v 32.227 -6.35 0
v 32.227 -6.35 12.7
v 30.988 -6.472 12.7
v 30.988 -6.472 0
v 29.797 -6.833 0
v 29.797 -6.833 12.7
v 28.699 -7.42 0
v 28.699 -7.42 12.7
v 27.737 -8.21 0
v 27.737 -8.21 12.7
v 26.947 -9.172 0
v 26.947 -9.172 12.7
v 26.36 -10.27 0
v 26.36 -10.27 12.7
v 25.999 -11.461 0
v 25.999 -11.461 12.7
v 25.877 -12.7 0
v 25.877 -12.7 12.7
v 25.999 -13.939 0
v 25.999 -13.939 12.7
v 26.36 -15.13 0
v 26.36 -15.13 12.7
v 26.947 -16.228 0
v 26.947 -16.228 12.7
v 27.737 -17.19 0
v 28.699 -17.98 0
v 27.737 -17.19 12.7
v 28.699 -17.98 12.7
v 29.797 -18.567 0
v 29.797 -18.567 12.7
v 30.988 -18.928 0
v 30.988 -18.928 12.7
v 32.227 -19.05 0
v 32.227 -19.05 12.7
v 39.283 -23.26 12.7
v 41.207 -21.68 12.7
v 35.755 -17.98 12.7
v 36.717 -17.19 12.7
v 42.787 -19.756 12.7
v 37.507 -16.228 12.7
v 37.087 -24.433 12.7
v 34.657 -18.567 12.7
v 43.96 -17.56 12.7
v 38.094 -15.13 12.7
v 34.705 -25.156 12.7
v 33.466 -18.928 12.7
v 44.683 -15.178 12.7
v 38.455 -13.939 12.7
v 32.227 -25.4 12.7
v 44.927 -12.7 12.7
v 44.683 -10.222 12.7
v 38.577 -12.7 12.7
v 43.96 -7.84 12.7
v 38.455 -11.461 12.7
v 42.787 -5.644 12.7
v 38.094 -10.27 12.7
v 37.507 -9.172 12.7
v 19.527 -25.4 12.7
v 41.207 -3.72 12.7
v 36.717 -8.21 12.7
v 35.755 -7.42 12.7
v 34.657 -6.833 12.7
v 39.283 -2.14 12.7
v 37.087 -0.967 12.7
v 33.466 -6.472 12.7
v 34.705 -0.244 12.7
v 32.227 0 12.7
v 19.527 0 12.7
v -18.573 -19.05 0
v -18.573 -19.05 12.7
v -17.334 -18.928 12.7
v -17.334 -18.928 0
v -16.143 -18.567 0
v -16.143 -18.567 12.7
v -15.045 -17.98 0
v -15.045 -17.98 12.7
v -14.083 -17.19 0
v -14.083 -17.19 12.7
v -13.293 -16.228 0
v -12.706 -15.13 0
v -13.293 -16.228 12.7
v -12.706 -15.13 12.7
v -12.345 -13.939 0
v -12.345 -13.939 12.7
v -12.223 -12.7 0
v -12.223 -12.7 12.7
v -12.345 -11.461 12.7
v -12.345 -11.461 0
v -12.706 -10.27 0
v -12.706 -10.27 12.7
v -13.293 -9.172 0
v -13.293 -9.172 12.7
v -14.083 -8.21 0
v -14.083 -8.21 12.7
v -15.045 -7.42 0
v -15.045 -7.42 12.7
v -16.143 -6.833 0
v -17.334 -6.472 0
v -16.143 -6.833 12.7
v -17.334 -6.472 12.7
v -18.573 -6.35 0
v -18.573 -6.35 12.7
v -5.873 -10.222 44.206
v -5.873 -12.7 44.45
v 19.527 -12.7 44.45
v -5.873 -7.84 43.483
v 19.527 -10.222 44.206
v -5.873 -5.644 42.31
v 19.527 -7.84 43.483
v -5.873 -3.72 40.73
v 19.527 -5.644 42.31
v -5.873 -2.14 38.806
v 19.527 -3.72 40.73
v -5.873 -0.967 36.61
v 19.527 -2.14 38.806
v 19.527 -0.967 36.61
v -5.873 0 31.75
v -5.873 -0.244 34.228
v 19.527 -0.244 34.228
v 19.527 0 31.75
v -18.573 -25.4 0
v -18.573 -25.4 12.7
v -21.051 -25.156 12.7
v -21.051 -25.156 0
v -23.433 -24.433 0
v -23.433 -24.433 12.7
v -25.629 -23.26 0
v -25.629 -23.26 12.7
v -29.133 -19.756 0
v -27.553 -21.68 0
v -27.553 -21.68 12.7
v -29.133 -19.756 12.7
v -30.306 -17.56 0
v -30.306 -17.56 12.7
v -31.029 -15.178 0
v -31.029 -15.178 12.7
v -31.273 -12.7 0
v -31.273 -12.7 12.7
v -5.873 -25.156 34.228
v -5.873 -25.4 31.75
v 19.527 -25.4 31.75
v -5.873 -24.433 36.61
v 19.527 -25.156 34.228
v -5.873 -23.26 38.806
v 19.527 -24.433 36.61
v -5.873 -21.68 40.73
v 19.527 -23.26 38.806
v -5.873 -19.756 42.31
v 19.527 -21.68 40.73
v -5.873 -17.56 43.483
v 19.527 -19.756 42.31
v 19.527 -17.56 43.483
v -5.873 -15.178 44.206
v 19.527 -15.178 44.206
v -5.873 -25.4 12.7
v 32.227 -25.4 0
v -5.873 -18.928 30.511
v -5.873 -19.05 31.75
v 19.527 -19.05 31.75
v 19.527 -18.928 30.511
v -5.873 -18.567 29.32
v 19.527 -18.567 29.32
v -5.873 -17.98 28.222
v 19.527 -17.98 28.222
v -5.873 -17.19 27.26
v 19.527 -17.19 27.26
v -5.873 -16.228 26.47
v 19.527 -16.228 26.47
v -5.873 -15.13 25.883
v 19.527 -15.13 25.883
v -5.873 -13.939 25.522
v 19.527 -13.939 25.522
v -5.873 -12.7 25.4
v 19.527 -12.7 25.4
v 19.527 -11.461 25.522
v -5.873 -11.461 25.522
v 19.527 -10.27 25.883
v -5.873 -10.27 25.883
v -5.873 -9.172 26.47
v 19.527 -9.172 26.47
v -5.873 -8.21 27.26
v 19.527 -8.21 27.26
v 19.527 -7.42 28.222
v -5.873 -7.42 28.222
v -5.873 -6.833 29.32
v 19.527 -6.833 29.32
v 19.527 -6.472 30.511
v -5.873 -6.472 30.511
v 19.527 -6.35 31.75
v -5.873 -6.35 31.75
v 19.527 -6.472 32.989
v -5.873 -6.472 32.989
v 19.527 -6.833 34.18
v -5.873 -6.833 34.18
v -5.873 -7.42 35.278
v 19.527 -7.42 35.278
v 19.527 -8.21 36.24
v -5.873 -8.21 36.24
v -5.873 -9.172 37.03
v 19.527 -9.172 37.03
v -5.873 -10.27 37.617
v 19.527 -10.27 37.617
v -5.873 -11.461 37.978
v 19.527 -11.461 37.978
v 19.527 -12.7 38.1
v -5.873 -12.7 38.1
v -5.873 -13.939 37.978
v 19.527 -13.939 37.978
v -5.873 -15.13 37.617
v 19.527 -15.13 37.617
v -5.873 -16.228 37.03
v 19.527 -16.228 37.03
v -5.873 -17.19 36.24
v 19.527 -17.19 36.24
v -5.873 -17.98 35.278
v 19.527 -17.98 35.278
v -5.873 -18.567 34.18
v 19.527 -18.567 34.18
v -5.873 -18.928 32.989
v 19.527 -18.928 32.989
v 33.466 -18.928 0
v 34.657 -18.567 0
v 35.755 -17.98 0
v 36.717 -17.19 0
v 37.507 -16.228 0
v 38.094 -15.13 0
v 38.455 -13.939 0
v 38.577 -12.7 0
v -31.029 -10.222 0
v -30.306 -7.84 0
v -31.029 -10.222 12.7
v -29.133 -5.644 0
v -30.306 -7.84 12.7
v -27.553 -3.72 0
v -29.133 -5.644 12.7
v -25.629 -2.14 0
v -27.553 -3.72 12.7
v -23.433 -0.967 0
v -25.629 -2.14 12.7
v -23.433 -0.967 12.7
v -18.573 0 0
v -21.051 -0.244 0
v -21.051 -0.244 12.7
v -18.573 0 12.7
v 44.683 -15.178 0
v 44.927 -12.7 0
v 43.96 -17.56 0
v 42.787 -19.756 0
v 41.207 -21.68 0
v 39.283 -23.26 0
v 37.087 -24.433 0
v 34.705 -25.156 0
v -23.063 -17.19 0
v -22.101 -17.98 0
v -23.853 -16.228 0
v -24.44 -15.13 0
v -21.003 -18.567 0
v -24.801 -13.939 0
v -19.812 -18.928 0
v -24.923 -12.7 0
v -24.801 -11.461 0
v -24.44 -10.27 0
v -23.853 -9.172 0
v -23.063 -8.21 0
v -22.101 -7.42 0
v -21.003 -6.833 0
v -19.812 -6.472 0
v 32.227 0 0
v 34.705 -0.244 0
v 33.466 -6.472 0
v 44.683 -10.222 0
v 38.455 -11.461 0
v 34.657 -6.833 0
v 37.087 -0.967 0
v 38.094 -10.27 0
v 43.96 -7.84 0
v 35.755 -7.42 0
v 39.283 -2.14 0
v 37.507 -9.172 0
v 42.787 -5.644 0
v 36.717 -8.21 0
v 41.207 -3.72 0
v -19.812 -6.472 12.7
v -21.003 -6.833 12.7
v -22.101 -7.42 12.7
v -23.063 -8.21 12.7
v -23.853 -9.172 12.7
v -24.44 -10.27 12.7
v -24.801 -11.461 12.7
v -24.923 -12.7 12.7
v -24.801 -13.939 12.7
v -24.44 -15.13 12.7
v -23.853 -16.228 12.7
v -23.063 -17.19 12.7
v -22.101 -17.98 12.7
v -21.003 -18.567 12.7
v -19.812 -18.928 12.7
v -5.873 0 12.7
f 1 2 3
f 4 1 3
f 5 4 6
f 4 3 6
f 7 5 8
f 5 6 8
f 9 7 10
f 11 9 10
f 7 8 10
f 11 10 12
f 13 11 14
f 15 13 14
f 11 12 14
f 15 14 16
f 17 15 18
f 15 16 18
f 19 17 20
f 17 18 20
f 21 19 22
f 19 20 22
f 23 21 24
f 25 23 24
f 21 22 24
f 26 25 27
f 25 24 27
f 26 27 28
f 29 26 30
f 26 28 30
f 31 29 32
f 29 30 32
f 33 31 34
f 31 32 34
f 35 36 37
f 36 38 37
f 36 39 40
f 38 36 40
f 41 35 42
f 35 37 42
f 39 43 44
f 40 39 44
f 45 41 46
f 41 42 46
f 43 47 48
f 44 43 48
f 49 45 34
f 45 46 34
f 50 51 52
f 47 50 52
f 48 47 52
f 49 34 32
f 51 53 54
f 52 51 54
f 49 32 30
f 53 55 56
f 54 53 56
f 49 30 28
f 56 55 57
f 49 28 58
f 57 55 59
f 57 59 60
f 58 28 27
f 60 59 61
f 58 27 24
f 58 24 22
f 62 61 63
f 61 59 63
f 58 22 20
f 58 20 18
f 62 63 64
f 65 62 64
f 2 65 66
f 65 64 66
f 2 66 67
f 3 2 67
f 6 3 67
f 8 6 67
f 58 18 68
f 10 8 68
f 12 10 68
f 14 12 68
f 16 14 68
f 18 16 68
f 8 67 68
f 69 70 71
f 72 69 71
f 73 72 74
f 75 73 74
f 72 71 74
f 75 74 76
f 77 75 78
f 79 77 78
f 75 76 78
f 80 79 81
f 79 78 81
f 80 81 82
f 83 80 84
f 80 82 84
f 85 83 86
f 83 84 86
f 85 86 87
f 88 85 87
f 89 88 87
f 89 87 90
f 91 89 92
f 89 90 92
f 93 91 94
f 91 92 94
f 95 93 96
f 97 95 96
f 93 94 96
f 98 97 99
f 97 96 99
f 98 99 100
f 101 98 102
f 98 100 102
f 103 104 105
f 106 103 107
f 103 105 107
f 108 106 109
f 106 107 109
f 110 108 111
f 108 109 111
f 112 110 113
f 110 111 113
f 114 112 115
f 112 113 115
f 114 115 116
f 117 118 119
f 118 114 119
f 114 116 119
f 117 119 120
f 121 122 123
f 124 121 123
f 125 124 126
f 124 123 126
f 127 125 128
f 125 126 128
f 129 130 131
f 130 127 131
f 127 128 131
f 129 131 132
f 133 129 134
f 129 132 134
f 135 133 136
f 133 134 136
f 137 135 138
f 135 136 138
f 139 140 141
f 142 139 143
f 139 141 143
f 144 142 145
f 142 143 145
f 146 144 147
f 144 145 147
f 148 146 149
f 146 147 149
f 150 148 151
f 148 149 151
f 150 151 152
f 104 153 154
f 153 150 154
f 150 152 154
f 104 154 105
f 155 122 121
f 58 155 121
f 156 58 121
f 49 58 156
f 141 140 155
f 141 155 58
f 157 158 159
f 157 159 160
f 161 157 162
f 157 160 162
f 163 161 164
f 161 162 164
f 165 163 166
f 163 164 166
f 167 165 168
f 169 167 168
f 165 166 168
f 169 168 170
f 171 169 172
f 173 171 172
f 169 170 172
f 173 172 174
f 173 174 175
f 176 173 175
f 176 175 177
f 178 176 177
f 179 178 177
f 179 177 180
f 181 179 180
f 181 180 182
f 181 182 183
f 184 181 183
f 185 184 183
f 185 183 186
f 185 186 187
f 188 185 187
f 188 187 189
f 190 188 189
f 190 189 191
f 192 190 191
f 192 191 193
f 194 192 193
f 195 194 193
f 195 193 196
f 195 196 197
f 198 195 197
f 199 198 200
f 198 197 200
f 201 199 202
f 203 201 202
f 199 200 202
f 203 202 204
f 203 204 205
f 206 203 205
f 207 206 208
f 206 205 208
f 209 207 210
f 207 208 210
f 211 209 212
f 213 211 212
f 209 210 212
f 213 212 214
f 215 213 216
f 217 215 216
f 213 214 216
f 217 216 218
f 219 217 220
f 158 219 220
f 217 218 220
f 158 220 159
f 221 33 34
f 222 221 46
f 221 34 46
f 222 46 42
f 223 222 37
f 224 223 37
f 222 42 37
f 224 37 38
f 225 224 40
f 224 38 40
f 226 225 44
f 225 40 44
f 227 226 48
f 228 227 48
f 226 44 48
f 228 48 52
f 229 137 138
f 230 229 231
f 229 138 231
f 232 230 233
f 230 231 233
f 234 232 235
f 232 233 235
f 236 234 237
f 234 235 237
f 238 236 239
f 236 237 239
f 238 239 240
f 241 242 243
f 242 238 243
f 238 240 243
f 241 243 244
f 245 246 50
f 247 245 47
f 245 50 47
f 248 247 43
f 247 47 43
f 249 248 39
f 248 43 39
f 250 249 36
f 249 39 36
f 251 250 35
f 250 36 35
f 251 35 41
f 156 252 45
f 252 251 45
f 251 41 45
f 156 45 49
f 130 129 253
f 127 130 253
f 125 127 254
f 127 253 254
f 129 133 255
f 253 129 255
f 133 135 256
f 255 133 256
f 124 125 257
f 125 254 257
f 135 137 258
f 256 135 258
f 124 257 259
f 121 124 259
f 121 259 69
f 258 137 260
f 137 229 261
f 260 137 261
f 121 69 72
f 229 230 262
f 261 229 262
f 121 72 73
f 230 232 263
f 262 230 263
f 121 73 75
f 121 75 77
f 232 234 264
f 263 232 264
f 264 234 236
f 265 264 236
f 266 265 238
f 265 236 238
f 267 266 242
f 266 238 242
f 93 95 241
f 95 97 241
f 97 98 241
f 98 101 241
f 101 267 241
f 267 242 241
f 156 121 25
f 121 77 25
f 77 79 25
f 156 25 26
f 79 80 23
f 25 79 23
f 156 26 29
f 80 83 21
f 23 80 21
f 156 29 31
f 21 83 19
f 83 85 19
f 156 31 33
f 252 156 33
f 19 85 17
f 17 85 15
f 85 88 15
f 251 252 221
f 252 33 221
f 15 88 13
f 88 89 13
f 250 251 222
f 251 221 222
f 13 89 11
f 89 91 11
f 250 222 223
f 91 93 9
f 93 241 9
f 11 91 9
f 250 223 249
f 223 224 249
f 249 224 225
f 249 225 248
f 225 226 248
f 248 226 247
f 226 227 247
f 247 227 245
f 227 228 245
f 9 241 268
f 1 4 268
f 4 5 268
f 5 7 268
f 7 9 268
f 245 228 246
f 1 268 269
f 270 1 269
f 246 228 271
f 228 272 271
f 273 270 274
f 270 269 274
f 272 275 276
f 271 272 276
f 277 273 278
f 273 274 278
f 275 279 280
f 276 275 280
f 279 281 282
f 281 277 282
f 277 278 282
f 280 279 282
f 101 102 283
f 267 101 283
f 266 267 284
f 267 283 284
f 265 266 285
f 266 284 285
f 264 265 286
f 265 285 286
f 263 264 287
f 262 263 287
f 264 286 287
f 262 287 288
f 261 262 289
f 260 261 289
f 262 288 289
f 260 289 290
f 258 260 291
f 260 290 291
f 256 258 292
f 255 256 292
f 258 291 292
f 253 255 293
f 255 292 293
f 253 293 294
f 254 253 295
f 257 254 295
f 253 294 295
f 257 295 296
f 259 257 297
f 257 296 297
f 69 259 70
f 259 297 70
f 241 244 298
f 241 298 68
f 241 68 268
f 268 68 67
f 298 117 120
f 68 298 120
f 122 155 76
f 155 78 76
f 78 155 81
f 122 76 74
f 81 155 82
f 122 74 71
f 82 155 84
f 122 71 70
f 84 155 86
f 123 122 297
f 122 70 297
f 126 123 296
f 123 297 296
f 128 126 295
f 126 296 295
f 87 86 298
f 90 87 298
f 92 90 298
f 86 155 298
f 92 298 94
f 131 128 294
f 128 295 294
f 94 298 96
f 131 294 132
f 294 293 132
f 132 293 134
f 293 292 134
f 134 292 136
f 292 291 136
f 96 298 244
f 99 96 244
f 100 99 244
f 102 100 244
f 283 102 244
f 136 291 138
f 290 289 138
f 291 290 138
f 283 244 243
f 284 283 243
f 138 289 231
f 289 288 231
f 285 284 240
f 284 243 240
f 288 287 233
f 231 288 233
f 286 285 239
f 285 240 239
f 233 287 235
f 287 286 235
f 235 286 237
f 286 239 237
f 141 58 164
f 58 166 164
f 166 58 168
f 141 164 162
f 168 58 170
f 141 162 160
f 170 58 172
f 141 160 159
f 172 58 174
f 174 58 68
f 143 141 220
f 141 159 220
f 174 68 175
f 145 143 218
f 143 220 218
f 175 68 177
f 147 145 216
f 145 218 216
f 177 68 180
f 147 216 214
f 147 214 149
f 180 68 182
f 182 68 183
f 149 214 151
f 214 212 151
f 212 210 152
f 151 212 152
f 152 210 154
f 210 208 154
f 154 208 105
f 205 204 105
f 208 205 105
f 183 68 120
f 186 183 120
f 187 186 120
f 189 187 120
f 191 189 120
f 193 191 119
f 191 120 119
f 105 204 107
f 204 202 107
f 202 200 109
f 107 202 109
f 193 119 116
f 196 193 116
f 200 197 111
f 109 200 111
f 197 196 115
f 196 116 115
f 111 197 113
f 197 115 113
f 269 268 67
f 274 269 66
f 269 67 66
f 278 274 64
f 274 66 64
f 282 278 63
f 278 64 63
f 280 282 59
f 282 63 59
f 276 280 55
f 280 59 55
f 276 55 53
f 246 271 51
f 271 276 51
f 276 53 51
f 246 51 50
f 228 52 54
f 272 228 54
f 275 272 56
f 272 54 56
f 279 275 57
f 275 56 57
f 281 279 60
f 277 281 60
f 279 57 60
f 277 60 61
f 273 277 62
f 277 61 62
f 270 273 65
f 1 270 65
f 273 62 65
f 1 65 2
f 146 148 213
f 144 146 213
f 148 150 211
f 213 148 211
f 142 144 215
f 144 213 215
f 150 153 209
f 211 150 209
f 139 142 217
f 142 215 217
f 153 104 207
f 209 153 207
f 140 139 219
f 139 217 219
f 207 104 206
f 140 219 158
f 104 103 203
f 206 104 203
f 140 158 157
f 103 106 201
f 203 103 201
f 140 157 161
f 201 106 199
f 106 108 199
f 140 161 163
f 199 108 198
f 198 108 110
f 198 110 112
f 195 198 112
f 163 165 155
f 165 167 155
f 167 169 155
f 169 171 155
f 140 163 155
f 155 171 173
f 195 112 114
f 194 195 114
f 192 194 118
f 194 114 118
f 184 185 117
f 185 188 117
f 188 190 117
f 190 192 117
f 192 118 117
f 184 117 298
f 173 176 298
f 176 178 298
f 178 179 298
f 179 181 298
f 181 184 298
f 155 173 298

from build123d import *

# Parameters (mm, degrees)
F1_DEPTH = 25.4
F3_DEPTH = 12.701
F5_DEPTH = 12.701
F7_DEPTH = 50.801


with BuildPart() as f1:
    # F0 (on Front) → F1 (new body)
    with BuildSketch(Plane.XZ):
        Polygon((-31.273121752, 12.7), (-31.273121752, 0), (44.926878248, 0), (44.926878248, 12.7), (19.526878248, 12.7), (19.526878248, 44.45), (-5.873121752, 44.45), (-5.873121752, 12.7), align=None)
    extrude(amount=F1_DEPTH)

    # F2 (on face) → F3 (cut, through all)
    with BuildSketch(Plane.XY.offset(12.7)):
        with BuildLine():
            ThreePointArc((38.576878248, -12.7), (36.7170063085, -8.2098719395), (32.226878248, -6.35))
            Line((32.226878248, -6.35), (32.226878248, -19.05))
            ThreePointArc((32.226878248, -19.05), (36.7170063085, -17.1901280605), (38.576878248, -12.7))
        make_face()
        with BuildLine():
            Line((32.226878248, -19.05), (32.226878248, -6.35))
            ThreePointArc((32.226878248, -6.35), (25.876878248, -12.7), (32.226878248, -19.05))
        make_face()
        with BuildLine():
            Line((44.926878248, 0), (32.226878248, 0))
            ThreePointArc((32.226878248, 0), (41.2071343691, -3.7197438789), (44.926878248, -12.7))
            Line((44.926878248, -12.7), (44.926878248, 0))
        make_face()
        with BuildLine():
            Line((44.926878248, -25.4), (44.926878248, -12.7))
            ThreePointArc((44.926878248, -12.7), (41.2071343691, -21.6802561211), (32.226878248, -25.4))
            Line((32.226878248, -25.4), (44.926878248, -25.4))
        make_face()
    extrude(amount=-F3_DEPTH, mode=Mode.SUBTRACT)

    # F4 (on face) → F5 (cut, through all)
    with BuildSketch(Plane.XY.offset(12.7)):
        with BuildLine():
            ThreePointArc((-12.223121752, -12.7), (-14.0829936915, -8.2098719395), (-18.573121752, -6.35))
            Line((-18.573121752, -6.35), (-18.573121752, -19.05))
            ThreePointArc((-18.573121752, -19.05), (-14.0829936915, -17.1901280605), (-12.223121752, -12.7))
        make_face()
        with BuildLine():
            Line((-18.573121752, -19.05), (-18.573121752, -6.35))
            ThreePointArc((-18.573121752, -6.35), (-24.923121752, -12.7), (-18.573121752, -19.05))
        make_face()
        with BuildLine():
            ThreePointArc((-31.273121752, -12.7), (-27.5533778731, -3.7197438789), (-18.573121752, 0))
            Line((-18.573121752, 0), (-31.273121752, 0))
            Line((-31.273121752, 0), (-31.273121752, -12.7))
        make_face()
        with BuildLine():
            ThreePointArc((-18.573121752, -25.4), (-27.5533778731, -21.6802561211), (-31.273121752, -12.7))
            Line((-31.273121752, -12.7), (-31.273121752, -25.4))
            Line((-31.273121752, -25.4), (-18.573121752, -25.4))
        make_face()
    extrude(amount=-F5_DEPTH, mode=Mode.SUBTRACT)

    # F6 (on face) → F7 (cut, through all)
    with BuildSketch(Plane.YZ.offset(19.526878248)):
        with BuildLine():
            ThreePointArc((-25.4, 31.75), (-21.6802561211, 40.7302561211), (-12.7, 44.45))
            Line((-12.7, 44.45), (-25.4, 44.45))
            Line((-25.4, 44.45), (-25.4, 31.75))
        make_face()
        with BuildLine():
            ThreePointArc((-12.7, 44.45), (-3.7197438789, 40.7302561211), (0, 31.75))
            Line((0, 31.75), (0, 44.45))
            Line((0, 44.45), (-12.7, 44.45))
        make_face()
        with BuildLine():
            Line((-19.05, 31.75), (-6.35, 31.75))
            ThreePointArc((-6.35, 31.75), (-12.7, 38.1), (-19.05, 31.75))
        make_face()
        with BuildLine():
            ThreePointArc((-19.05, 31.75), (-12.7, 25.4), (-6.35, 31.75))
            Line((-6.35, 31.75), (-19.05, 31.75))
        make_face()
    extrude(amount=-F7_DEPTH, mode=Mode.SUBTRACT)


solid = f1.part
